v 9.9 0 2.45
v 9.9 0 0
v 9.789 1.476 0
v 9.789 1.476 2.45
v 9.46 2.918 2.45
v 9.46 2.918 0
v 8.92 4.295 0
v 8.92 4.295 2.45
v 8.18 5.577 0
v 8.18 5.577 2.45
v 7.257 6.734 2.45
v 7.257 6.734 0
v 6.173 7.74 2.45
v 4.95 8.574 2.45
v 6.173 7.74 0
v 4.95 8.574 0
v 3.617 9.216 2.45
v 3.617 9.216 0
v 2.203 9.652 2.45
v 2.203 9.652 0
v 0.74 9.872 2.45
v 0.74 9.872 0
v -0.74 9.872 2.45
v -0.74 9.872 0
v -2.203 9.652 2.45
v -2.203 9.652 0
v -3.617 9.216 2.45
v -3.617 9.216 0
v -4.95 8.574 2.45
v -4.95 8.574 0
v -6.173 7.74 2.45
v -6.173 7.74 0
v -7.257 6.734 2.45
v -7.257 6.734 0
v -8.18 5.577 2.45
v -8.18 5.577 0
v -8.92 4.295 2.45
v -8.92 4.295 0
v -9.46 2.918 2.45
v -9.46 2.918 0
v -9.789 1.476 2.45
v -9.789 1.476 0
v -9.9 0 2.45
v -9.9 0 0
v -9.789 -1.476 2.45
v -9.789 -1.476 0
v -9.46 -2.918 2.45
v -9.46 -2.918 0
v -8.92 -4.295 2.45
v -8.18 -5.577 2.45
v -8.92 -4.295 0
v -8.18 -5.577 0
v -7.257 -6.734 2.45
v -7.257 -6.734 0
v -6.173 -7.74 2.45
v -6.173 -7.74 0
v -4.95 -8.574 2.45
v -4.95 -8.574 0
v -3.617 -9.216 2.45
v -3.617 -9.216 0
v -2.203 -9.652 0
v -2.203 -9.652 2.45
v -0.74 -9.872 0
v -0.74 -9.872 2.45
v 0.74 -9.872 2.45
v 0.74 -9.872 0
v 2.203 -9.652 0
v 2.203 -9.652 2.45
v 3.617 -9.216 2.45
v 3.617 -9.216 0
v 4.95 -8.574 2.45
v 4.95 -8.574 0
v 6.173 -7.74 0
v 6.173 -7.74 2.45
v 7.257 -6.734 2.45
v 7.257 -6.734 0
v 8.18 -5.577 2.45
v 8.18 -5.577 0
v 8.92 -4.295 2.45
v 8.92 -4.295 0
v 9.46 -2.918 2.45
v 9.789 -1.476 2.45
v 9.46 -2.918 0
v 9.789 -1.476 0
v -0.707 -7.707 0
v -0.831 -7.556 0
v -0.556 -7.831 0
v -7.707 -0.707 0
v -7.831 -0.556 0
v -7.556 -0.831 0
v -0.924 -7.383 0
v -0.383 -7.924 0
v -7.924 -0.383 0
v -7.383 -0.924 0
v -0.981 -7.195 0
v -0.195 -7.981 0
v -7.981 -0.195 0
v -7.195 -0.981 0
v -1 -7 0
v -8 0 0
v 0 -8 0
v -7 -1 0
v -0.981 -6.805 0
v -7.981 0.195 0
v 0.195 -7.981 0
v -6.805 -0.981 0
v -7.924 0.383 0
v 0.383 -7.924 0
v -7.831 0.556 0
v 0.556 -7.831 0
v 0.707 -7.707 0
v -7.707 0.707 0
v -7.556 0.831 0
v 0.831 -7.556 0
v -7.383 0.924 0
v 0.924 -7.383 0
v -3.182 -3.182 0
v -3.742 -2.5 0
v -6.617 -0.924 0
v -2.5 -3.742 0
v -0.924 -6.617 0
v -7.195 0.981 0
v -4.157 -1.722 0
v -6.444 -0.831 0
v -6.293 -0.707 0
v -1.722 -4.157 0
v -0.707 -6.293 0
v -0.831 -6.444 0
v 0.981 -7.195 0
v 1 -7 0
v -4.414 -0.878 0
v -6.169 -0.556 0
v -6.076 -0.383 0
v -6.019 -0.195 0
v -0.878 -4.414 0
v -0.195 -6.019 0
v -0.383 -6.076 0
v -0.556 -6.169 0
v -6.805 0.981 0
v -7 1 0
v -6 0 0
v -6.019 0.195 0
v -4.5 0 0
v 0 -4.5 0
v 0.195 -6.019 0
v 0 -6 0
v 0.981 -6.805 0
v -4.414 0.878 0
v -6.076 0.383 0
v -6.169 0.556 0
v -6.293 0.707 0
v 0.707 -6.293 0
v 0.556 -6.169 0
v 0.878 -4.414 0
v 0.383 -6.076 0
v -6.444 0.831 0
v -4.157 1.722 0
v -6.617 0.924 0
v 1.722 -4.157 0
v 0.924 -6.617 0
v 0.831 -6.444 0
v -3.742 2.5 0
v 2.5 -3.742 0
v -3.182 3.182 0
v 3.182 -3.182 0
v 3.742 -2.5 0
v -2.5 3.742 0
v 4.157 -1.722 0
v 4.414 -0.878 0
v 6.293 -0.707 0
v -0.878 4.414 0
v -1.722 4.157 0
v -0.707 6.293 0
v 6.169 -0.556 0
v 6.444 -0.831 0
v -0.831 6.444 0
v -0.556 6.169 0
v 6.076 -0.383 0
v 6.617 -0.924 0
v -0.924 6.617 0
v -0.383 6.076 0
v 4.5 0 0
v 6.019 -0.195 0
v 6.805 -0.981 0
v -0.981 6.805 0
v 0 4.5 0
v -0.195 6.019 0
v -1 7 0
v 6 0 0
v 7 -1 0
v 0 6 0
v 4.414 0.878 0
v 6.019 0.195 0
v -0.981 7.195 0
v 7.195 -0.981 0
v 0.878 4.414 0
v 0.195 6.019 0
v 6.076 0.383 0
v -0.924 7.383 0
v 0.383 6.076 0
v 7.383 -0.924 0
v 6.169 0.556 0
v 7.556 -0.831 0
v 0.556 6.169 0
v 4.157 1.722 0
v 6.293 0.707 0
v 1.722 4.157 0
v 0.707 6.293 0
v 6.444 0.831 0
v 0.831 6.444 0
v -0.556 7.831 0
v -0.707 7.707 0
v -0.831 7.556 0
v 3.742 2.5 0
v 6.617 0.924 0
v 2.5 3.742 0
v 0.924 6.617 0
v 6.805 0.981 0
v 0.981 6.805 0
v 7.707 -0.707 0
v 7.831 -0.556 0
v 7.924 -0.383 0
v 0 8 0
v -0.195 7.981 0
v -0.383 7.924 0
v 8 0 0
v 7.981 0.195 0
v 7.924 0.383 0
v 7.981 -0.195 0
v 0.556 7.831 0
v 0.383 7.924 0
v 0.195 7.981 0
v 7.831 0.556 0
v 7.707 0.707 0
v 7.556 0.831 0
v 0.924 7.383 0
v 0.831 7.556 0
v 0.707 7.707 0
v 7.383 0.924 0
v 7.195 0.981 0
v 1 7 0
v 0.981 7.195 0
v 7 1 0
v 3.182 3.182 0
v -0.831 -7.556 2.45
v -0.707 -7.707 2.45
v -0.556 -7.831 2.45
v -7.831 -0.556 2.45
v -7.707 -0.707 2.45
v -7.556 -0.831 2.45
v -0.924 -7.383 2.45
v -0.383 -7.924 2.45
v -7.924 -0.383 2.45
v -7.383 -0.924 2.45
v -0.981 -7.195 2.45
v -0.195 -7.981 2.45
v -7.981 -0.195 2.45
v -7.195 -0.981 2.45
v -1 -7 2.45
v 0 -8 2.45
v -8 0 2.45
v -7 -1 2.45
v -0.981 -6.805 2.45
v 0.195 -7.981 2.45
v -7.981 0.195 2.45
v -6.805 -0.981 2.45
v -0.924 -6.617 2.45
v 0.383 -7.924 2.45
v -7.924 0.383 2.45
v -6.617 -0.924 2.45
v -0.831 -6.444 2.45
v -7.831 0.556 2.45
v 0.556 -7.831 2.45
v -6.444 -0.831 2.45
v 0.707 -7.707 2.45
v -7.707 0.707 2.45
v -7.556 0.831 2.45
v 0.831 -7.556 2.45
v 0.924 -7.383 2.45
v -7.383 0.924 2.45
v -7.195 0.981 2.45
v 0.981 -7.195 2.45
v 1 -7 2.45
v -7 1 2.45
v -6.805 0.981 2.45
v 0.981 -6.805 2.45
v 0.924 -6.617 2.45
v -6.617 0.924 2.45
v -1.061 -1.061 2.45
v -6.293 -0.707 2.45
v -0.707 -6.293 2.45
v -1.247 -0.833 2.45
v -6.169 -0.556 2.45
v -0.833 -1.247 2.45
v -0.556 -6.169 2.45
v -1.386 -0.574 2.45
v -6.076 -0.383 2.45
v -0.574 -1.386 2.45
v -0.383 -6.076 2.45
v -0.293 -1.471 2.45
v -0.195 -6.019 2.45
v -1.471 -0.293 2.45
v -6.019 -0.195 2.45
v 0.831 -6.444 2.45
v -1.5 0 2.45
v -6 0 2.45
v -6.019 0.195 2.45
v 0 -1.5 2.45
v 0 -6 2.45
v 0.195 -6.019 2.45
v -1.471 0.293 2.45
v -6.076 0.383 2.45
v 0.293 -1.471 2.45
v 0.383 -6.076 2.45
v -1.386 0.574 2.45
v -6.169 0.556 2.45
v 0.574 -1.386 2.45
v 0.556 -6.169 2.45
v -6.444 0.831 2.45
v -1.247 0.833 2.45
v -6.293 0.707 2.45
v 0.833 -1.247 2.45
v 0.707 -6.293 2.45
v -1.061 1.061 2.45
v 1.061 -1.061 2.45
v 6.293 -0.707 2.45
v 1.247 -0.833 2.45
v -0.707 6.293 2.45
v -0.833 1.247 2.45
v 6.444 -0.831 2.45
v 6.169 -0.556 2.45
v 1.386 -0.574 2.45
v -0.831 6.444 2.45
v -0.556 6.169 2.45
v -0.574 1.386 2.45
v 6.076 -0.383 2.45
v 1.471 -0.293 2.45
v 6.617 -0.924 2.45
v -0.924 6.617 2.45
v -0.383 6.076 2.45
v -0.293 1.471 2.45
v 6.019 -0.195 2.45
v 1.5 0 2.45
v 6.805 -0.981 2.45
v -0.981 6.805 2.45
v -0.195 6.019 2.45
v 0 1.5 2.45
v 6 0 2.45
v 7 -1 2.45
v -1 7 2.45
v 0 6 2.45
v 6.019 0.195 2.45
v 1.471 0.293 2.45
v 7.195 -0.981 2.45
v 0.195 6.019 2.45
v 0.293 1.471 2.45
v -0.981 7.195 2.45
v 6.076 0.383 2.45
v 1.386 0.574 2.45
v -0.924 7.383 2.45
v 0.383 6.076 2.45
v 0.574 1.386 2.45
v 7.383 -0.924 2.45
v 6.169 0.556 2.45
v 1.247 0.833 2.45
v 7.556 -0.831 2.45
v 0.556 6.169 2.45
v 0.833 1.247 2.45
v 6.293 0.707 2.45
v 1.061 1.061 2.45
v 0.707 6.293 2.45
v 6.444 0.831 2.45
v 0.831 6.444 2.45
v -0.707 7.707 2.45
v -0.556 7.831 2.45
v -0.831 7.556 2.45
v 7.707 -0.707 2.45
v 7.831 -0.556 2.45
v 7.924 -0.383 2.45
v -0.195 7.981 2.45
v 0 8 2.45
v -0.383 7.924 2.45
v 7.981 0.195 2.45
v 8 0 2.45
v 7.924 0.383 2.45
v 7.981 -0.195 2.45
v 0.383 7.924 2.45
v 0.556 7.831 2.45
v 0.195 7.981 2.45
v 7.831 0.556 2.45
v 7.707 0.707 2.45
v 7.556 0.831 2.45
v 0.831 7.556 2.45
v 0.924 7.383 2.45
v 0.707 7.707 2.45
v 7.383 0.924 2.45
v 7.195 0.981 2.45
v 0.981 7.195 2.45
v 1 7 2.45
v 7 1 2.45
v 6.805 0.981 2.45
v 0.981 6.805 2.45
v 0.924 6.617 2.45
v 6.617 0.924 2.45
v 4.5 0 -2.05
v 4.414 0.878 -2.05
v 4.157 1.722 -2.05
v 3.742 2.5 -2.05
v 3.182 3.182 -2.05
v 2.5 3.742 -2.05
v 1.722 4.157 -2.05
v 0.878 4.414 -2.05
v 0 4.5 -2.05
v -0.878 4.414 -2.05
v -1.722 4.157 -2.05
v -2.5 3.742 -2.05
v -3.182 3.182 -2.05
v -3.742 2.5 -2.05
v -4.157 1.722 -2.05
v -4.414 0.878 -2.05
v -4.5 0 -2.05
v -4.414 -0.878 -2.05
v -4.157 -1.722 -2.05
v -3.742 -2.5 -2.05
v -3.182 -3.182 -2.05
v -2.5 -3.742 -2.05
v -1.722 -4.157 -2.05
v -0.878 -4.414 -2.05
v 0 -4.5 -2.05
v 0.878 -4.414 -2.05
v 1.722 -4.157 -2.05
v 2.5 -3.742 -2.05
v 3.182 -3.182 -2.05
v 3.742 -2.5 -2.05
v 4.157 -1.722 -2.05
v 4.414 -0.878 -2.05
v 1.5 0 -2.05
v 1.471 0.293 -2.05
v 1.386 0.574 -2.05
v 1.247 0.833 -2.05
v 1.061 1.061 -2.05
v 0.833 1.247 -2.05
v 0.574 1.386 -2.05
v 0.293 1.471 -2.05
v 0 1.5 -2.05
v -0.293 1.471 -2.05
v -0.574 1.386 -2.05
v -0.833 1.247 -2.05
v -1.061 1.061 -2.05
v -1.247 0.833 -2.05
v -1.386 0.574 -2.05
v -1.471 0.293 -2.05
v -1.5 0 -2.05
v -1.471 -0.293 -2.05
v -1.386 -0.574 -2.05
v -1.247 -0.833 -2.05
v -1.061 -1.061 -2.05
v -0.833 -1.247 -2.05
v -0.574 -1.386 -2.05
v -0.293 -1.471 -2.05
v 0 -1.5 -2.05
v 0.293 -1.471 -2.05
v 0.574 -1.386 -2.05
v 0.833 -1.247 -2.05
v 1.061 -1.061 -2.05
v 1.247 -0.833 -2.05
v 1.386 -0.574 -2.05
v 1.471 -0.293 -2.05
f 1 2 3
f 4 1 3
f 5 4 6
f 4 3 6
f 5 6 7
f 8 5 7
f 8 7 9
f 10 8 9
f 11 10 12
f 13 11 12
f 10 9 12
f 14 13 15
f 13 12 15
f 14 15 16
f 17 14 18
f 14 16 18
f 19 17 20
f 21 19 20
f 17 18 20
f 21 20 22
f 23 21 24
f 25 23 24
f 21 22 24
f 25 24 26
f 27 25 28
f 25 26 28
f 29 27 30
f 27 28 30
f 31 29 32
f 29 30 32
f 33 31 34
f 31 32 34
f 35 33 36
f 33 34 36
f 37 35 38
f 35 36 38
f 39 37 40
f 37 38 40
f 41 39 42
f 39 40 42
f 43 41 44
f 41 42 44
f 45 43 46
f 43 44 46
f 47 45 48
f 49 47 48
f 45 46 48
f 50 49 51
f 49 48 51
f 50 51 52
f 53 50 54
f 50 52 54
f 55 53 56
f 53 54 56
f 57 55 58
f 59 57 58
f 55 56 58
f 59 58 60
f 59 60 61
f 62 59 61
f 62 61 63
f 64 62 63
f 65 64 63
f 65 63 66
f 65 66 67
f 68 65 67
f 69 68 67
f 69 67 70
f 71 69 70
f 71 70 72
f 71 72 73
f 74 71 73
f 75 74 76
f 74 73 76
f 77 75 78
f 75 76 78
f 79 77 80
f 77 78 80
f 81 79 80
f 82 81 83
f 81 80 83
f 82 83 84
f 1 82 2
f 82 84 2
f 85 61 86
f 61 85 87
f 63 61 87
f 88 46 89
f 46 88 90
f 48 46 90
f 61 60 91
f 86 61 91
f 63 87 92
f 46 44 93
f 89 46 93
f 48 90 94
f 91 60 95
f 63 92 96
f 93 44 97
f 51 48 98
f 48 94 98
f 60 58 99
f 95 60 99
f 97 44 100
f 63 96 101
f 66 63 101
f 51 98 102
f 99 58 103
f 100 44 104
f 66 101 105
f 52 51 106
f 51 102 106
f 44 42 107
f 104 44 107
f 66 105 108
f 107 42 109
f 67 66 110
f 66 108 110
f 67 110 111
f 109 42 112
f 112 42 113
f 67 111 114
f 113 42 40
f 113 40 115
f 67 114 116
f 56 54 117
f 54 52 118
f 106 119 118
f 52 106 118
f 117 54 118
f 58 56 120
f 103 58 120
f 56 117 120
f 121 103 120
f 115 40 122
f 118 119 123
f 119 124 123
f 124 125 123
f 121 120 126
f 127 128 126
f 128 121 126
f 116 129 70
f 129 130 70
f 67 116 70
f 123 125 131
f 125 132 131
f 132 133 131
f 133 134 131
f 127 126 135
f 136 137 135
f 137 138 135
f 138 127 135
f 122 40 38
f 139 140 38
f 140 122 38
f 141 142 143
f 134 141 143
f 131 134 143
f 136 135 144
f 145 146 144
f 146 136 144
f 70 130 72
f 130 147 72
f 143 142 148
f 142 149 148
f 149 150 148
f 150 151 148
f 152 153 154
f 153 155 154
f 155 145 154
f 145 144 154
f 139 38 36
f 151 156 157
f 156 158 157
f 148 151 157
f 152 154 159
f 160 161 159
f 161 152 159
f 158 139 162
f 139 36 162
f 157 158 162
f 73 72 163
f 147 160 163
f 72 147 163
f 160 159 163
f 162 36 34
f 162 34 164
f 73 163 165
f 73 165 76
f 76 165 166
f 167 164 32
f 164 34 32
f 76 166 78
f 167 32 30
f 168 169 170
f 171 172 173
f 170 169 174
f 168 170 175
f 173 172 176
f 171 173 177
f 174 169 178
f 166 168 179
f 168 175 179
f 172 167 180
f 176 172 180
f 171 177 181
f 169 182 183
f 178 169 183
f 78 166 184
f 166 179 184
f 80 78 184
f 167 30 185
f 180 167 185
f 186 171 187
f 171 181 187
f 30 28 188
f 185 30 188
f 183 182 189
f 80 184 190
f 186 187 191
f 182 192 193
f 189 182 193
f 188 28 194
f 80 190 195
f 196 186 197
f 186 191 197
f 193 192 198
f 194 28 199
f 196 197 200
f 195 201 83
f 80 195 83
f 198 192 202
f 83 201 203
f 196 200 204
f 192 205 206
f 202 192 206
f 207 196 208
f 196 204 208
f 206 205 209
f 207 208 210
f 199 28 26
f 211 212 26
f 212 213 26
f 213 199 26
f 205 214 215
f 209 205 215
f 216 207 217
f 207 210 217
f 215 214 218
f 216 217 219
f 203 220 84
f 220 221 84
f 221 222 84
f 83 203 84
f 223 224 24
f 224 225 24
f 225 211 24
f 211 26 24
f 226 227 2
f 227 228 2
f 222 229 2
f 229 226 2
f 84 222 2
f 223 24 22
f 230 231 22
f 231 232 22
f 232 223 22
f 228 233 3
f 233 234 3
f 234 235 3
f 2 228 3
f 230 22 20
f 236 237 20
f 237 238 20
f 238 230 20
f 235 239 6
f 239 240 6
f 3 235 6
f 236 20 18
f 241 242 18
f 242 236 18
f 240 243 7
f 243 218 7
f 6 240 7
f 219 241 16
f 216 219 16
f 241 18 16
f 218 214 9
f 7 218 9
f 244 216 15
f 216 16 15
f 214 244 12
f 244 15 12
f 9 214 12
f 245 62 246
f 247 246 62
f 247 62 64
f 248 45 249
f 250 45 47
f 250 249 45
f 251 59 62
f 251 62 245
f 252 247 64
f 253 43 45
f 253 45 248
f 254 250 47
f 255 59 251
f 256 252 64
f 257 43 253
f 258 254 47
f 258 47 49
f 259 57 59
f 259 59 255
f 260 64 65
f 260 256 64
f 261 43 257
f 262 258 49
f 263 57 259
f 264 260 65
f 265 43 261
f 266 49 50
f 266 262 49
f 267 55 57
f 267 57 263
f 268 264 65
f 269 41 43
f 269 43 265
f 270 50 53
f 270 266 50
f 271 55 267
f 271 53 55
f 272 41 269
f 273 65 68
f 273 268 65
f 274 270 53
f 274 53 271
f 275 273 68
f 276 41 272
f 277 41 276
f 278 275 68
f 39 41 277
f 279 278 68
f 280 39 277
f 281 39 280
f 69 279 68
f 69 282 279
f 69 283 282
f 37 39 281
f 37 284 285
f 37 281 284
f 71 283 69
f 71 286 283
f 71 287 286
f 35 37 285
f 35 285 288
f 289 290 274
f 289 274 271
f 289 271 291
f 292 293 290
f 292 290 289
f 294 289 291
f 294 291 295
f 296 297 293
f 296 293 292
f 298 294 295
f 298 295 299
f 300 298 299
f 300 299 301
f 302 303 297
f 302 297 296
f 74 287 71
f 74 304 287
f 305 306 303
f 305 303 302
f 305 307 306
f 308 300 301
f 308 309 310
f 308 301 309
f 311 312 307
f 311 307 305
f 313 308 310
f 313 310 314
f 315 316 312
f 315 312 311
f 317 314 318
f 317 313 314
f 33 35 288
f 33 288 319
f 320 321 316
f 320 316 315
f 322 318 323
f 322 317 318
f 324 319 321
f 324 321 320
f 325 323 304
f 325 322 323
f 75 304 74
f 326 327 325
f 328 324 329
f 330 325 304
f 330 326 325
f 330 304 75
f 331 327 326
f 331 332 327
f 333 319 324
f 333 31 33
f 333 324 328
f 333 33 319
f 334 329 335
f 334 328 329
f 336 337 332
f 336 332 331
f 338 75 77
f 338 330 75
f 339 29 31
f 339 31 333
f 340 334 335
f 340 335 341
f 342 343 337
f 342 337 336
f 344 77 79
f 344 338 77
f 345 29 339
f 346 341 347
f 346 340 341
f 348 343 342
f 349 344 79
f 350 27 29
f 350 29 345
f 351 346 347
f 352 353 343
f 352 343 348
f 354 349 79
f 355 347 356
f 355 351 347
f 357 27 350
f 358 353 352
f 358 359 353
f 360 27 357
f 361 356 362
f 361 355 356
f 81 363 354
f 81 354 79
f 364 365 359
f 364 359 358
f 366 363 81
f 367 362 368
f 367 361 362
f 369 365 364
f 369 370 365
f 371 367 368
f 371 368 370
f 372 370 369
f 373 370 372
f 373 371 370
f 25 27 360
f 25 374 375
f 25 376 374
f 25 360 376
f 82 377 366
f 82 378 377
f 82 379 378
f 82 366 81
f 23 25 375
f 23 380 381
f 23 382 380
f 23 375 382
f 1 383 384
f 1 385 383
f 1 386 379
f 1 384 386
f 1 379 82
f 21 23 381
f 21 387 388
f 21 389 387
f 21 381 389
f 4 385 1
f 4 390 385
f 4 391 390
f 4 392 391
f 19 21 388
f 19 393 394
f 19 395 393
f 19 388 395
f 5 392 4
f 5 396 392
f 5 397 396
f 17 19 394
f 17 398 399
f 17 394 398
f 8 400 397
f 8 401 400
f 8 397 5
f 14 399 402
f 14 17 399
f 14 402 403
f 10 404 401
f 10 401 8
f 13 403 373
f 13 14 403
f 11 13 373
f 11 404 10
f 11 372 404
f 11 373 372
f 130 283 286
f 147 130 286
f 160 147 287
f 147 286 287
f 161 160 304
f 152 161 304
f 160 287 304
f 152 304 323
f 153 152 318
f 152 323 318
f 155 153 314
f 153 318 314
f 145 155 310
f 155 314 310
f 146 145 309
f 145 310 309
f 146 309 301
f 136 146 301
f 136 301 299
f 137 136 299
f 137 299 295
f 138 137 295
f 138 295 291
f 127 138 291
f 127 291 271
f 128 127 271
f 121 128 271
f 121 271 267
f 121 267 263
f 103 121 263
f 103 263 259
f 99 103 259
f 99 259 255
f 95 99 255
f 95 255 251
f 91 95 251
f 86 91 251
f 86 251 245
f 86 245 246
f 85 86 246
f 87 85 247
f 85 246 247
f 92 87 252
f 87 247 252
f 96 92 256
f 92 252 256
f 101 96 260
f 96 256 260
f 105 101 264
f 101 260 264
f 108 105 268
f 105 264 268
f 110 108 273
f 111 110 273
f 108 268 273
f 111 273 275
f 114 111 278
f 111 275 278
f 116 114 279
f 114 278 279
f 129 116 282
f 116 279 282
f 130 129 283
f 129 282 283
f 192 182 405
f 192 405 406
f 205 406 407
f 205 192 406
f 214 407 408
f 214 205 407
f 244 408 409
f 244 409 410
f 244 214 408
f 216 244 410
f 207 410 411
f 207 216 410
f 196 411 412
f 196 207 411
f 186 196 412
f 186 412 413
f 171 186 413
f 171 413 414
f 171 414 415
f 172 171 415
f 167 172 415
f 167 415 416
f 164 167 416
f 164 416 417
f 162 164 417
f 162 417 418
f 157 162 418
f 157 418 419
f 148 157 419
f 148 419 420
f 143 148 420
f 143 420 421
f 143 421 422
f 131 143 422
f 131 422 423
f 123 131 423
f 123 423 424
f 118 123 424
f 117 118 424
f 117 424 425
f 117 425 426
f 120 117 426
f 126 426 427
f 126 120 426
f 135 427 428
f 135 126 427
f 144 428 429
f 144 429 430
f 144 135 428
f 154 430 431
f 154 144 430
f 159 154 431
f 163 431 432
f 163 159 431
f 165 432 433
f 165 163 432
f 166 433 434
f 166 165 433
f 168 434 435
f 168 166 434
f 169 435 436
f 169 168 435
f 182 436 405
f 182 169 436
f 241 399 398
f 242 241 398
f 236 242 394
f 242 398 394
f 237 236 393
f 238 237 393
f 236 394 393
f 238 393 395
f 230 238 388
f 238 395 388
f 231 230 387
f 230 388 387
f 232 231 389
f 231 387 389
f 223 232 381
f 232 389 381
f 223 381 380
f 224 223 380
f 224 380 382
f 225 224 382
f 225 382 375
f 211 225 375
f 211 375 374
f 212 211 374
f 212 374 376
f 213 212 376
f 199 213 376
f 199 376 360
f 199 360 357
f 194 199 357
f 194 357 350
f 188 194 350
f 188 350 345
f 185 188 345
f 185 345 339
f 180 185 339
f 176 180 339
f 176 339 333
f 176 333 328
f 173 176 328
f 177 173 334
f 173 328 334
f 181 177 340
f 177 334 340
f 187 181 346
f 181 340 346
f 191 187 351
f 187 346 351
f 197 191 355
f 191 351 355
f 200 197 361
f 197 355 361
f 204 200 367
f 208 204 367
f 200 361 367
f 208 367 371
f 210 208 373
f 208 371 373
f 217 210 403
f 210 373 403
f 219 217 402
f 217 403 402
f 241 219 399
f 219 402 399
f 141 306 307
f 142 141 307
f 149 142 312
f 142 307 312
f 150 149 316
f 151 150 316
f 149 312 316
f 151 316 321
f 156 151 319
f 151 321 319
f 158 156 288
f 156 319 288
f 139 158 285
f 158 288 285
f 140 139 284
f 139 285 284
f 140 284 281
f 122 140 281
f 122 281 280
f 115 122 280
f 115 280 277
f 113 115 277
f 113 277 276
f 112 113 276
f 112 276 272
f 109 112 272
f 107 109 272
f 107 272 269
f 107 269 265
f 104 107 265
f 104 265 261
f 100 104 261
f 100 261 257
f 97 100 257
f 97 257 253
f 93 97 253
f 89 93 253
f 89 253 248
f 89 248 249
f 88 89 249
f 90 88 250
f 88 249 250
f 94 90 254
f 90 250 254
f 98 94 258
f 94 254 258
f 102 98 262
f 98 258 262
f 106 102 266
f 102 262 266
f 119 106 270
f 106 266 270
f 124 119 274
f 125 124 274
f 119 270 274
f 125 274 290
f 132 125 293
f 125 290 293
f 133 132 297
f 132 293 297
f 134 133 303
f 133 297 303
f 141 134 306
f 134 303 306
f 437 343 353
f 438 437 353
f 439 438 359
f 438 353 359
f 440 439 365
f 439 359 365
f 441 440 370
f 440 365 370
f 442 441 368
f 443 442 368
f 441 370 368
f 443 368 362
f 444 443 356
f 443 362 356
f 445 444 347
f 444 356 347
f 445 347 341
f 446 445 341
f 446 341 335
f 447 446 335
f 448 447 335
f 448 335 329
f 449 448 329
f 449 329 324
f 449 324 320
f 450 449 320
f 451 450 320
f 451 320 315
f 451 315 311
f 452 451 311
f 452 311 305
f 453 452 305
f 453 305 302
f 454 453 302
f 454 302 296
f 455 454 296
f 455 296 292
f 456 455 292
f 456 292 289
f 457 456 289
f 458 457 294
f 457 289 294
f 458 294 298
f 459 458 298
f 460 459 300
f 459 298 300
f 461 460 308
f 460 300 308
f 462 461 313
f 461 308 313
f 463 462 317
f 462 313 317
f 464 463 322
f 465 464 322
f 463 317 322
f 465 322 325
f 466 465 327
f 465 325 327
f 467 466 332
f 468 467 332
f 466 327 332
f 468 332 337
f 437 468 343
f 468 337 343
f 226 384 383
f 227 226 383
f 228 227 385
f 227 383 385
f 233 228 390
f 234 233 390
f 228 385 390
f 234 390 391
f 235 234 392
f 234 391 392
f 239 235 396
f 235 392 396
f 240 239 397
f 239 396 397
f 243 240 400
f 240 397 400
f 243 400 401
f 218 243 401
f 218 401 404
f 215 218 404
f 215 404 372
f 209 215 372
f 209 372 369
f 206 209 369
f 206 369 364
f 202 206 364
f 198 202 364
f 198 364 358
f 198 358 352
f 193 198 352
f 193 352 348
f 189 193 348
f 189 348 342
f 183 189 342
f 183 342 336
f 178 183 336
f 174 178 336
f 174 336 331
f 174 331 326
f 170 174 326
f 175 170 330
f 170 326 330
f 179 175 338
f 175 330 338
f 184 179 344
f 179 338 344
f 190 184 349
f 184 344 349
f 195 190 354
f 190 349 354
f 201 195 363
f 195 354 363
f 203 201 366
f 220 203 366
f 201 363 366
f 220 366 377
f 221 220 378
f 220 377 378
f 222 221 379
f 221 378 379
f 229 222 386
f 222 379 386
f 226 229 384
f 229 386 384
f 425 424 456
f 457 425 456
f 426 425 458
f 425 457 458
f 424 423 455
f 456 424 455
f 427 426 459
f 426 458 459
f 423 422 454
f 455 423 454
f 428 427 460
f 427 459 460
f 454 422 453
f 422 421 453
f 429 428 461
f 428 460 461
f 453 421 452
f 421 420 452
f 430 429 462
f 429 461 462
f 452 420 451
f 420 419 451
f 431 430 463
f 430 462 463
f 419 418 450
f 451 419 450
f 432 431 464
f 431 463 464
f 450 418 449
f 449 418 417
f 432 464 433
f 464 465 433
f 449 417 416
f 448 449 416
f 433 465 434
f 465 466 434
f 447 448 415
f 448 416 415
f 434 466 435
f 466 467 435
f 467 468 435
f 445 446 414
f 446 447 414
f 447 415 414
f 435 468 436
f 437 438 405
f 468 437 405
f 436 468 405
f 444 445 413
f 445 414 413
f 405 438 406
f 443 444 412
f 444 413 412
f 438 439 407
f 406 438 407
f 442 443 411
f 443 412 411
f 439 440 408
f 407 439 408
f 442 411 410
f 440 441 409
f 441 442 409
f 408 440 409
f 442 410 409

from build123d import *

# Parameters (mm, degrees)
CROQUIS1_R              = 9.9
SALIENTE_EXTRUIR1_DEPTH = 2.45
CROQUIS2_R              = 4.5
SALIENTE_EXTRUIR2_DEPTH = 4.5
CROQUIS3_R              = 1.5
CROQUIS3_R_2            = 1
CORTAR_EXTRUIR1_DEPTH   = 15.706121175


with BuildPart() as part:
    # Croquis1 → Saliente-Extruir1 (new body)
    with BuildSketch(Plane.XY):
        Circle(CROQUIS1_R)
    extrude(amount=SALIENTE_EXTRUIR1_DEPTH)

    # Croquis2 → Saliente-Extruir2 (add)
    with BuildSketch(Plane.XY.offset(2.45)):
        Circle(CROQUIS2_R)
    extrude(amount=-SALIENTE_EXTRUIR2_DEPTH)

    # Croquis3 → Cortar-Extruir1 (cut, through all)
    with BuildSketch(Plane.XY.offset(2.45)):
        Circle(CROQUIS3_R)
        with Locations((7, 0)):
            Circle(CROQUIS3_R_2)
        with Locations((0, -7)):
            Circle(CROQUIS3_R_2)
        with Locations((-7, 0)):
            Circle(CROQUIS3_R_2)
        with Locations((0, 7)):
            Circle(CROQUIS3_R_2)
    extrude(amount=-CORTAR_EXTRUIR1_DEPTH, mode=Mode.SUBTRACT)


solid = part.part
